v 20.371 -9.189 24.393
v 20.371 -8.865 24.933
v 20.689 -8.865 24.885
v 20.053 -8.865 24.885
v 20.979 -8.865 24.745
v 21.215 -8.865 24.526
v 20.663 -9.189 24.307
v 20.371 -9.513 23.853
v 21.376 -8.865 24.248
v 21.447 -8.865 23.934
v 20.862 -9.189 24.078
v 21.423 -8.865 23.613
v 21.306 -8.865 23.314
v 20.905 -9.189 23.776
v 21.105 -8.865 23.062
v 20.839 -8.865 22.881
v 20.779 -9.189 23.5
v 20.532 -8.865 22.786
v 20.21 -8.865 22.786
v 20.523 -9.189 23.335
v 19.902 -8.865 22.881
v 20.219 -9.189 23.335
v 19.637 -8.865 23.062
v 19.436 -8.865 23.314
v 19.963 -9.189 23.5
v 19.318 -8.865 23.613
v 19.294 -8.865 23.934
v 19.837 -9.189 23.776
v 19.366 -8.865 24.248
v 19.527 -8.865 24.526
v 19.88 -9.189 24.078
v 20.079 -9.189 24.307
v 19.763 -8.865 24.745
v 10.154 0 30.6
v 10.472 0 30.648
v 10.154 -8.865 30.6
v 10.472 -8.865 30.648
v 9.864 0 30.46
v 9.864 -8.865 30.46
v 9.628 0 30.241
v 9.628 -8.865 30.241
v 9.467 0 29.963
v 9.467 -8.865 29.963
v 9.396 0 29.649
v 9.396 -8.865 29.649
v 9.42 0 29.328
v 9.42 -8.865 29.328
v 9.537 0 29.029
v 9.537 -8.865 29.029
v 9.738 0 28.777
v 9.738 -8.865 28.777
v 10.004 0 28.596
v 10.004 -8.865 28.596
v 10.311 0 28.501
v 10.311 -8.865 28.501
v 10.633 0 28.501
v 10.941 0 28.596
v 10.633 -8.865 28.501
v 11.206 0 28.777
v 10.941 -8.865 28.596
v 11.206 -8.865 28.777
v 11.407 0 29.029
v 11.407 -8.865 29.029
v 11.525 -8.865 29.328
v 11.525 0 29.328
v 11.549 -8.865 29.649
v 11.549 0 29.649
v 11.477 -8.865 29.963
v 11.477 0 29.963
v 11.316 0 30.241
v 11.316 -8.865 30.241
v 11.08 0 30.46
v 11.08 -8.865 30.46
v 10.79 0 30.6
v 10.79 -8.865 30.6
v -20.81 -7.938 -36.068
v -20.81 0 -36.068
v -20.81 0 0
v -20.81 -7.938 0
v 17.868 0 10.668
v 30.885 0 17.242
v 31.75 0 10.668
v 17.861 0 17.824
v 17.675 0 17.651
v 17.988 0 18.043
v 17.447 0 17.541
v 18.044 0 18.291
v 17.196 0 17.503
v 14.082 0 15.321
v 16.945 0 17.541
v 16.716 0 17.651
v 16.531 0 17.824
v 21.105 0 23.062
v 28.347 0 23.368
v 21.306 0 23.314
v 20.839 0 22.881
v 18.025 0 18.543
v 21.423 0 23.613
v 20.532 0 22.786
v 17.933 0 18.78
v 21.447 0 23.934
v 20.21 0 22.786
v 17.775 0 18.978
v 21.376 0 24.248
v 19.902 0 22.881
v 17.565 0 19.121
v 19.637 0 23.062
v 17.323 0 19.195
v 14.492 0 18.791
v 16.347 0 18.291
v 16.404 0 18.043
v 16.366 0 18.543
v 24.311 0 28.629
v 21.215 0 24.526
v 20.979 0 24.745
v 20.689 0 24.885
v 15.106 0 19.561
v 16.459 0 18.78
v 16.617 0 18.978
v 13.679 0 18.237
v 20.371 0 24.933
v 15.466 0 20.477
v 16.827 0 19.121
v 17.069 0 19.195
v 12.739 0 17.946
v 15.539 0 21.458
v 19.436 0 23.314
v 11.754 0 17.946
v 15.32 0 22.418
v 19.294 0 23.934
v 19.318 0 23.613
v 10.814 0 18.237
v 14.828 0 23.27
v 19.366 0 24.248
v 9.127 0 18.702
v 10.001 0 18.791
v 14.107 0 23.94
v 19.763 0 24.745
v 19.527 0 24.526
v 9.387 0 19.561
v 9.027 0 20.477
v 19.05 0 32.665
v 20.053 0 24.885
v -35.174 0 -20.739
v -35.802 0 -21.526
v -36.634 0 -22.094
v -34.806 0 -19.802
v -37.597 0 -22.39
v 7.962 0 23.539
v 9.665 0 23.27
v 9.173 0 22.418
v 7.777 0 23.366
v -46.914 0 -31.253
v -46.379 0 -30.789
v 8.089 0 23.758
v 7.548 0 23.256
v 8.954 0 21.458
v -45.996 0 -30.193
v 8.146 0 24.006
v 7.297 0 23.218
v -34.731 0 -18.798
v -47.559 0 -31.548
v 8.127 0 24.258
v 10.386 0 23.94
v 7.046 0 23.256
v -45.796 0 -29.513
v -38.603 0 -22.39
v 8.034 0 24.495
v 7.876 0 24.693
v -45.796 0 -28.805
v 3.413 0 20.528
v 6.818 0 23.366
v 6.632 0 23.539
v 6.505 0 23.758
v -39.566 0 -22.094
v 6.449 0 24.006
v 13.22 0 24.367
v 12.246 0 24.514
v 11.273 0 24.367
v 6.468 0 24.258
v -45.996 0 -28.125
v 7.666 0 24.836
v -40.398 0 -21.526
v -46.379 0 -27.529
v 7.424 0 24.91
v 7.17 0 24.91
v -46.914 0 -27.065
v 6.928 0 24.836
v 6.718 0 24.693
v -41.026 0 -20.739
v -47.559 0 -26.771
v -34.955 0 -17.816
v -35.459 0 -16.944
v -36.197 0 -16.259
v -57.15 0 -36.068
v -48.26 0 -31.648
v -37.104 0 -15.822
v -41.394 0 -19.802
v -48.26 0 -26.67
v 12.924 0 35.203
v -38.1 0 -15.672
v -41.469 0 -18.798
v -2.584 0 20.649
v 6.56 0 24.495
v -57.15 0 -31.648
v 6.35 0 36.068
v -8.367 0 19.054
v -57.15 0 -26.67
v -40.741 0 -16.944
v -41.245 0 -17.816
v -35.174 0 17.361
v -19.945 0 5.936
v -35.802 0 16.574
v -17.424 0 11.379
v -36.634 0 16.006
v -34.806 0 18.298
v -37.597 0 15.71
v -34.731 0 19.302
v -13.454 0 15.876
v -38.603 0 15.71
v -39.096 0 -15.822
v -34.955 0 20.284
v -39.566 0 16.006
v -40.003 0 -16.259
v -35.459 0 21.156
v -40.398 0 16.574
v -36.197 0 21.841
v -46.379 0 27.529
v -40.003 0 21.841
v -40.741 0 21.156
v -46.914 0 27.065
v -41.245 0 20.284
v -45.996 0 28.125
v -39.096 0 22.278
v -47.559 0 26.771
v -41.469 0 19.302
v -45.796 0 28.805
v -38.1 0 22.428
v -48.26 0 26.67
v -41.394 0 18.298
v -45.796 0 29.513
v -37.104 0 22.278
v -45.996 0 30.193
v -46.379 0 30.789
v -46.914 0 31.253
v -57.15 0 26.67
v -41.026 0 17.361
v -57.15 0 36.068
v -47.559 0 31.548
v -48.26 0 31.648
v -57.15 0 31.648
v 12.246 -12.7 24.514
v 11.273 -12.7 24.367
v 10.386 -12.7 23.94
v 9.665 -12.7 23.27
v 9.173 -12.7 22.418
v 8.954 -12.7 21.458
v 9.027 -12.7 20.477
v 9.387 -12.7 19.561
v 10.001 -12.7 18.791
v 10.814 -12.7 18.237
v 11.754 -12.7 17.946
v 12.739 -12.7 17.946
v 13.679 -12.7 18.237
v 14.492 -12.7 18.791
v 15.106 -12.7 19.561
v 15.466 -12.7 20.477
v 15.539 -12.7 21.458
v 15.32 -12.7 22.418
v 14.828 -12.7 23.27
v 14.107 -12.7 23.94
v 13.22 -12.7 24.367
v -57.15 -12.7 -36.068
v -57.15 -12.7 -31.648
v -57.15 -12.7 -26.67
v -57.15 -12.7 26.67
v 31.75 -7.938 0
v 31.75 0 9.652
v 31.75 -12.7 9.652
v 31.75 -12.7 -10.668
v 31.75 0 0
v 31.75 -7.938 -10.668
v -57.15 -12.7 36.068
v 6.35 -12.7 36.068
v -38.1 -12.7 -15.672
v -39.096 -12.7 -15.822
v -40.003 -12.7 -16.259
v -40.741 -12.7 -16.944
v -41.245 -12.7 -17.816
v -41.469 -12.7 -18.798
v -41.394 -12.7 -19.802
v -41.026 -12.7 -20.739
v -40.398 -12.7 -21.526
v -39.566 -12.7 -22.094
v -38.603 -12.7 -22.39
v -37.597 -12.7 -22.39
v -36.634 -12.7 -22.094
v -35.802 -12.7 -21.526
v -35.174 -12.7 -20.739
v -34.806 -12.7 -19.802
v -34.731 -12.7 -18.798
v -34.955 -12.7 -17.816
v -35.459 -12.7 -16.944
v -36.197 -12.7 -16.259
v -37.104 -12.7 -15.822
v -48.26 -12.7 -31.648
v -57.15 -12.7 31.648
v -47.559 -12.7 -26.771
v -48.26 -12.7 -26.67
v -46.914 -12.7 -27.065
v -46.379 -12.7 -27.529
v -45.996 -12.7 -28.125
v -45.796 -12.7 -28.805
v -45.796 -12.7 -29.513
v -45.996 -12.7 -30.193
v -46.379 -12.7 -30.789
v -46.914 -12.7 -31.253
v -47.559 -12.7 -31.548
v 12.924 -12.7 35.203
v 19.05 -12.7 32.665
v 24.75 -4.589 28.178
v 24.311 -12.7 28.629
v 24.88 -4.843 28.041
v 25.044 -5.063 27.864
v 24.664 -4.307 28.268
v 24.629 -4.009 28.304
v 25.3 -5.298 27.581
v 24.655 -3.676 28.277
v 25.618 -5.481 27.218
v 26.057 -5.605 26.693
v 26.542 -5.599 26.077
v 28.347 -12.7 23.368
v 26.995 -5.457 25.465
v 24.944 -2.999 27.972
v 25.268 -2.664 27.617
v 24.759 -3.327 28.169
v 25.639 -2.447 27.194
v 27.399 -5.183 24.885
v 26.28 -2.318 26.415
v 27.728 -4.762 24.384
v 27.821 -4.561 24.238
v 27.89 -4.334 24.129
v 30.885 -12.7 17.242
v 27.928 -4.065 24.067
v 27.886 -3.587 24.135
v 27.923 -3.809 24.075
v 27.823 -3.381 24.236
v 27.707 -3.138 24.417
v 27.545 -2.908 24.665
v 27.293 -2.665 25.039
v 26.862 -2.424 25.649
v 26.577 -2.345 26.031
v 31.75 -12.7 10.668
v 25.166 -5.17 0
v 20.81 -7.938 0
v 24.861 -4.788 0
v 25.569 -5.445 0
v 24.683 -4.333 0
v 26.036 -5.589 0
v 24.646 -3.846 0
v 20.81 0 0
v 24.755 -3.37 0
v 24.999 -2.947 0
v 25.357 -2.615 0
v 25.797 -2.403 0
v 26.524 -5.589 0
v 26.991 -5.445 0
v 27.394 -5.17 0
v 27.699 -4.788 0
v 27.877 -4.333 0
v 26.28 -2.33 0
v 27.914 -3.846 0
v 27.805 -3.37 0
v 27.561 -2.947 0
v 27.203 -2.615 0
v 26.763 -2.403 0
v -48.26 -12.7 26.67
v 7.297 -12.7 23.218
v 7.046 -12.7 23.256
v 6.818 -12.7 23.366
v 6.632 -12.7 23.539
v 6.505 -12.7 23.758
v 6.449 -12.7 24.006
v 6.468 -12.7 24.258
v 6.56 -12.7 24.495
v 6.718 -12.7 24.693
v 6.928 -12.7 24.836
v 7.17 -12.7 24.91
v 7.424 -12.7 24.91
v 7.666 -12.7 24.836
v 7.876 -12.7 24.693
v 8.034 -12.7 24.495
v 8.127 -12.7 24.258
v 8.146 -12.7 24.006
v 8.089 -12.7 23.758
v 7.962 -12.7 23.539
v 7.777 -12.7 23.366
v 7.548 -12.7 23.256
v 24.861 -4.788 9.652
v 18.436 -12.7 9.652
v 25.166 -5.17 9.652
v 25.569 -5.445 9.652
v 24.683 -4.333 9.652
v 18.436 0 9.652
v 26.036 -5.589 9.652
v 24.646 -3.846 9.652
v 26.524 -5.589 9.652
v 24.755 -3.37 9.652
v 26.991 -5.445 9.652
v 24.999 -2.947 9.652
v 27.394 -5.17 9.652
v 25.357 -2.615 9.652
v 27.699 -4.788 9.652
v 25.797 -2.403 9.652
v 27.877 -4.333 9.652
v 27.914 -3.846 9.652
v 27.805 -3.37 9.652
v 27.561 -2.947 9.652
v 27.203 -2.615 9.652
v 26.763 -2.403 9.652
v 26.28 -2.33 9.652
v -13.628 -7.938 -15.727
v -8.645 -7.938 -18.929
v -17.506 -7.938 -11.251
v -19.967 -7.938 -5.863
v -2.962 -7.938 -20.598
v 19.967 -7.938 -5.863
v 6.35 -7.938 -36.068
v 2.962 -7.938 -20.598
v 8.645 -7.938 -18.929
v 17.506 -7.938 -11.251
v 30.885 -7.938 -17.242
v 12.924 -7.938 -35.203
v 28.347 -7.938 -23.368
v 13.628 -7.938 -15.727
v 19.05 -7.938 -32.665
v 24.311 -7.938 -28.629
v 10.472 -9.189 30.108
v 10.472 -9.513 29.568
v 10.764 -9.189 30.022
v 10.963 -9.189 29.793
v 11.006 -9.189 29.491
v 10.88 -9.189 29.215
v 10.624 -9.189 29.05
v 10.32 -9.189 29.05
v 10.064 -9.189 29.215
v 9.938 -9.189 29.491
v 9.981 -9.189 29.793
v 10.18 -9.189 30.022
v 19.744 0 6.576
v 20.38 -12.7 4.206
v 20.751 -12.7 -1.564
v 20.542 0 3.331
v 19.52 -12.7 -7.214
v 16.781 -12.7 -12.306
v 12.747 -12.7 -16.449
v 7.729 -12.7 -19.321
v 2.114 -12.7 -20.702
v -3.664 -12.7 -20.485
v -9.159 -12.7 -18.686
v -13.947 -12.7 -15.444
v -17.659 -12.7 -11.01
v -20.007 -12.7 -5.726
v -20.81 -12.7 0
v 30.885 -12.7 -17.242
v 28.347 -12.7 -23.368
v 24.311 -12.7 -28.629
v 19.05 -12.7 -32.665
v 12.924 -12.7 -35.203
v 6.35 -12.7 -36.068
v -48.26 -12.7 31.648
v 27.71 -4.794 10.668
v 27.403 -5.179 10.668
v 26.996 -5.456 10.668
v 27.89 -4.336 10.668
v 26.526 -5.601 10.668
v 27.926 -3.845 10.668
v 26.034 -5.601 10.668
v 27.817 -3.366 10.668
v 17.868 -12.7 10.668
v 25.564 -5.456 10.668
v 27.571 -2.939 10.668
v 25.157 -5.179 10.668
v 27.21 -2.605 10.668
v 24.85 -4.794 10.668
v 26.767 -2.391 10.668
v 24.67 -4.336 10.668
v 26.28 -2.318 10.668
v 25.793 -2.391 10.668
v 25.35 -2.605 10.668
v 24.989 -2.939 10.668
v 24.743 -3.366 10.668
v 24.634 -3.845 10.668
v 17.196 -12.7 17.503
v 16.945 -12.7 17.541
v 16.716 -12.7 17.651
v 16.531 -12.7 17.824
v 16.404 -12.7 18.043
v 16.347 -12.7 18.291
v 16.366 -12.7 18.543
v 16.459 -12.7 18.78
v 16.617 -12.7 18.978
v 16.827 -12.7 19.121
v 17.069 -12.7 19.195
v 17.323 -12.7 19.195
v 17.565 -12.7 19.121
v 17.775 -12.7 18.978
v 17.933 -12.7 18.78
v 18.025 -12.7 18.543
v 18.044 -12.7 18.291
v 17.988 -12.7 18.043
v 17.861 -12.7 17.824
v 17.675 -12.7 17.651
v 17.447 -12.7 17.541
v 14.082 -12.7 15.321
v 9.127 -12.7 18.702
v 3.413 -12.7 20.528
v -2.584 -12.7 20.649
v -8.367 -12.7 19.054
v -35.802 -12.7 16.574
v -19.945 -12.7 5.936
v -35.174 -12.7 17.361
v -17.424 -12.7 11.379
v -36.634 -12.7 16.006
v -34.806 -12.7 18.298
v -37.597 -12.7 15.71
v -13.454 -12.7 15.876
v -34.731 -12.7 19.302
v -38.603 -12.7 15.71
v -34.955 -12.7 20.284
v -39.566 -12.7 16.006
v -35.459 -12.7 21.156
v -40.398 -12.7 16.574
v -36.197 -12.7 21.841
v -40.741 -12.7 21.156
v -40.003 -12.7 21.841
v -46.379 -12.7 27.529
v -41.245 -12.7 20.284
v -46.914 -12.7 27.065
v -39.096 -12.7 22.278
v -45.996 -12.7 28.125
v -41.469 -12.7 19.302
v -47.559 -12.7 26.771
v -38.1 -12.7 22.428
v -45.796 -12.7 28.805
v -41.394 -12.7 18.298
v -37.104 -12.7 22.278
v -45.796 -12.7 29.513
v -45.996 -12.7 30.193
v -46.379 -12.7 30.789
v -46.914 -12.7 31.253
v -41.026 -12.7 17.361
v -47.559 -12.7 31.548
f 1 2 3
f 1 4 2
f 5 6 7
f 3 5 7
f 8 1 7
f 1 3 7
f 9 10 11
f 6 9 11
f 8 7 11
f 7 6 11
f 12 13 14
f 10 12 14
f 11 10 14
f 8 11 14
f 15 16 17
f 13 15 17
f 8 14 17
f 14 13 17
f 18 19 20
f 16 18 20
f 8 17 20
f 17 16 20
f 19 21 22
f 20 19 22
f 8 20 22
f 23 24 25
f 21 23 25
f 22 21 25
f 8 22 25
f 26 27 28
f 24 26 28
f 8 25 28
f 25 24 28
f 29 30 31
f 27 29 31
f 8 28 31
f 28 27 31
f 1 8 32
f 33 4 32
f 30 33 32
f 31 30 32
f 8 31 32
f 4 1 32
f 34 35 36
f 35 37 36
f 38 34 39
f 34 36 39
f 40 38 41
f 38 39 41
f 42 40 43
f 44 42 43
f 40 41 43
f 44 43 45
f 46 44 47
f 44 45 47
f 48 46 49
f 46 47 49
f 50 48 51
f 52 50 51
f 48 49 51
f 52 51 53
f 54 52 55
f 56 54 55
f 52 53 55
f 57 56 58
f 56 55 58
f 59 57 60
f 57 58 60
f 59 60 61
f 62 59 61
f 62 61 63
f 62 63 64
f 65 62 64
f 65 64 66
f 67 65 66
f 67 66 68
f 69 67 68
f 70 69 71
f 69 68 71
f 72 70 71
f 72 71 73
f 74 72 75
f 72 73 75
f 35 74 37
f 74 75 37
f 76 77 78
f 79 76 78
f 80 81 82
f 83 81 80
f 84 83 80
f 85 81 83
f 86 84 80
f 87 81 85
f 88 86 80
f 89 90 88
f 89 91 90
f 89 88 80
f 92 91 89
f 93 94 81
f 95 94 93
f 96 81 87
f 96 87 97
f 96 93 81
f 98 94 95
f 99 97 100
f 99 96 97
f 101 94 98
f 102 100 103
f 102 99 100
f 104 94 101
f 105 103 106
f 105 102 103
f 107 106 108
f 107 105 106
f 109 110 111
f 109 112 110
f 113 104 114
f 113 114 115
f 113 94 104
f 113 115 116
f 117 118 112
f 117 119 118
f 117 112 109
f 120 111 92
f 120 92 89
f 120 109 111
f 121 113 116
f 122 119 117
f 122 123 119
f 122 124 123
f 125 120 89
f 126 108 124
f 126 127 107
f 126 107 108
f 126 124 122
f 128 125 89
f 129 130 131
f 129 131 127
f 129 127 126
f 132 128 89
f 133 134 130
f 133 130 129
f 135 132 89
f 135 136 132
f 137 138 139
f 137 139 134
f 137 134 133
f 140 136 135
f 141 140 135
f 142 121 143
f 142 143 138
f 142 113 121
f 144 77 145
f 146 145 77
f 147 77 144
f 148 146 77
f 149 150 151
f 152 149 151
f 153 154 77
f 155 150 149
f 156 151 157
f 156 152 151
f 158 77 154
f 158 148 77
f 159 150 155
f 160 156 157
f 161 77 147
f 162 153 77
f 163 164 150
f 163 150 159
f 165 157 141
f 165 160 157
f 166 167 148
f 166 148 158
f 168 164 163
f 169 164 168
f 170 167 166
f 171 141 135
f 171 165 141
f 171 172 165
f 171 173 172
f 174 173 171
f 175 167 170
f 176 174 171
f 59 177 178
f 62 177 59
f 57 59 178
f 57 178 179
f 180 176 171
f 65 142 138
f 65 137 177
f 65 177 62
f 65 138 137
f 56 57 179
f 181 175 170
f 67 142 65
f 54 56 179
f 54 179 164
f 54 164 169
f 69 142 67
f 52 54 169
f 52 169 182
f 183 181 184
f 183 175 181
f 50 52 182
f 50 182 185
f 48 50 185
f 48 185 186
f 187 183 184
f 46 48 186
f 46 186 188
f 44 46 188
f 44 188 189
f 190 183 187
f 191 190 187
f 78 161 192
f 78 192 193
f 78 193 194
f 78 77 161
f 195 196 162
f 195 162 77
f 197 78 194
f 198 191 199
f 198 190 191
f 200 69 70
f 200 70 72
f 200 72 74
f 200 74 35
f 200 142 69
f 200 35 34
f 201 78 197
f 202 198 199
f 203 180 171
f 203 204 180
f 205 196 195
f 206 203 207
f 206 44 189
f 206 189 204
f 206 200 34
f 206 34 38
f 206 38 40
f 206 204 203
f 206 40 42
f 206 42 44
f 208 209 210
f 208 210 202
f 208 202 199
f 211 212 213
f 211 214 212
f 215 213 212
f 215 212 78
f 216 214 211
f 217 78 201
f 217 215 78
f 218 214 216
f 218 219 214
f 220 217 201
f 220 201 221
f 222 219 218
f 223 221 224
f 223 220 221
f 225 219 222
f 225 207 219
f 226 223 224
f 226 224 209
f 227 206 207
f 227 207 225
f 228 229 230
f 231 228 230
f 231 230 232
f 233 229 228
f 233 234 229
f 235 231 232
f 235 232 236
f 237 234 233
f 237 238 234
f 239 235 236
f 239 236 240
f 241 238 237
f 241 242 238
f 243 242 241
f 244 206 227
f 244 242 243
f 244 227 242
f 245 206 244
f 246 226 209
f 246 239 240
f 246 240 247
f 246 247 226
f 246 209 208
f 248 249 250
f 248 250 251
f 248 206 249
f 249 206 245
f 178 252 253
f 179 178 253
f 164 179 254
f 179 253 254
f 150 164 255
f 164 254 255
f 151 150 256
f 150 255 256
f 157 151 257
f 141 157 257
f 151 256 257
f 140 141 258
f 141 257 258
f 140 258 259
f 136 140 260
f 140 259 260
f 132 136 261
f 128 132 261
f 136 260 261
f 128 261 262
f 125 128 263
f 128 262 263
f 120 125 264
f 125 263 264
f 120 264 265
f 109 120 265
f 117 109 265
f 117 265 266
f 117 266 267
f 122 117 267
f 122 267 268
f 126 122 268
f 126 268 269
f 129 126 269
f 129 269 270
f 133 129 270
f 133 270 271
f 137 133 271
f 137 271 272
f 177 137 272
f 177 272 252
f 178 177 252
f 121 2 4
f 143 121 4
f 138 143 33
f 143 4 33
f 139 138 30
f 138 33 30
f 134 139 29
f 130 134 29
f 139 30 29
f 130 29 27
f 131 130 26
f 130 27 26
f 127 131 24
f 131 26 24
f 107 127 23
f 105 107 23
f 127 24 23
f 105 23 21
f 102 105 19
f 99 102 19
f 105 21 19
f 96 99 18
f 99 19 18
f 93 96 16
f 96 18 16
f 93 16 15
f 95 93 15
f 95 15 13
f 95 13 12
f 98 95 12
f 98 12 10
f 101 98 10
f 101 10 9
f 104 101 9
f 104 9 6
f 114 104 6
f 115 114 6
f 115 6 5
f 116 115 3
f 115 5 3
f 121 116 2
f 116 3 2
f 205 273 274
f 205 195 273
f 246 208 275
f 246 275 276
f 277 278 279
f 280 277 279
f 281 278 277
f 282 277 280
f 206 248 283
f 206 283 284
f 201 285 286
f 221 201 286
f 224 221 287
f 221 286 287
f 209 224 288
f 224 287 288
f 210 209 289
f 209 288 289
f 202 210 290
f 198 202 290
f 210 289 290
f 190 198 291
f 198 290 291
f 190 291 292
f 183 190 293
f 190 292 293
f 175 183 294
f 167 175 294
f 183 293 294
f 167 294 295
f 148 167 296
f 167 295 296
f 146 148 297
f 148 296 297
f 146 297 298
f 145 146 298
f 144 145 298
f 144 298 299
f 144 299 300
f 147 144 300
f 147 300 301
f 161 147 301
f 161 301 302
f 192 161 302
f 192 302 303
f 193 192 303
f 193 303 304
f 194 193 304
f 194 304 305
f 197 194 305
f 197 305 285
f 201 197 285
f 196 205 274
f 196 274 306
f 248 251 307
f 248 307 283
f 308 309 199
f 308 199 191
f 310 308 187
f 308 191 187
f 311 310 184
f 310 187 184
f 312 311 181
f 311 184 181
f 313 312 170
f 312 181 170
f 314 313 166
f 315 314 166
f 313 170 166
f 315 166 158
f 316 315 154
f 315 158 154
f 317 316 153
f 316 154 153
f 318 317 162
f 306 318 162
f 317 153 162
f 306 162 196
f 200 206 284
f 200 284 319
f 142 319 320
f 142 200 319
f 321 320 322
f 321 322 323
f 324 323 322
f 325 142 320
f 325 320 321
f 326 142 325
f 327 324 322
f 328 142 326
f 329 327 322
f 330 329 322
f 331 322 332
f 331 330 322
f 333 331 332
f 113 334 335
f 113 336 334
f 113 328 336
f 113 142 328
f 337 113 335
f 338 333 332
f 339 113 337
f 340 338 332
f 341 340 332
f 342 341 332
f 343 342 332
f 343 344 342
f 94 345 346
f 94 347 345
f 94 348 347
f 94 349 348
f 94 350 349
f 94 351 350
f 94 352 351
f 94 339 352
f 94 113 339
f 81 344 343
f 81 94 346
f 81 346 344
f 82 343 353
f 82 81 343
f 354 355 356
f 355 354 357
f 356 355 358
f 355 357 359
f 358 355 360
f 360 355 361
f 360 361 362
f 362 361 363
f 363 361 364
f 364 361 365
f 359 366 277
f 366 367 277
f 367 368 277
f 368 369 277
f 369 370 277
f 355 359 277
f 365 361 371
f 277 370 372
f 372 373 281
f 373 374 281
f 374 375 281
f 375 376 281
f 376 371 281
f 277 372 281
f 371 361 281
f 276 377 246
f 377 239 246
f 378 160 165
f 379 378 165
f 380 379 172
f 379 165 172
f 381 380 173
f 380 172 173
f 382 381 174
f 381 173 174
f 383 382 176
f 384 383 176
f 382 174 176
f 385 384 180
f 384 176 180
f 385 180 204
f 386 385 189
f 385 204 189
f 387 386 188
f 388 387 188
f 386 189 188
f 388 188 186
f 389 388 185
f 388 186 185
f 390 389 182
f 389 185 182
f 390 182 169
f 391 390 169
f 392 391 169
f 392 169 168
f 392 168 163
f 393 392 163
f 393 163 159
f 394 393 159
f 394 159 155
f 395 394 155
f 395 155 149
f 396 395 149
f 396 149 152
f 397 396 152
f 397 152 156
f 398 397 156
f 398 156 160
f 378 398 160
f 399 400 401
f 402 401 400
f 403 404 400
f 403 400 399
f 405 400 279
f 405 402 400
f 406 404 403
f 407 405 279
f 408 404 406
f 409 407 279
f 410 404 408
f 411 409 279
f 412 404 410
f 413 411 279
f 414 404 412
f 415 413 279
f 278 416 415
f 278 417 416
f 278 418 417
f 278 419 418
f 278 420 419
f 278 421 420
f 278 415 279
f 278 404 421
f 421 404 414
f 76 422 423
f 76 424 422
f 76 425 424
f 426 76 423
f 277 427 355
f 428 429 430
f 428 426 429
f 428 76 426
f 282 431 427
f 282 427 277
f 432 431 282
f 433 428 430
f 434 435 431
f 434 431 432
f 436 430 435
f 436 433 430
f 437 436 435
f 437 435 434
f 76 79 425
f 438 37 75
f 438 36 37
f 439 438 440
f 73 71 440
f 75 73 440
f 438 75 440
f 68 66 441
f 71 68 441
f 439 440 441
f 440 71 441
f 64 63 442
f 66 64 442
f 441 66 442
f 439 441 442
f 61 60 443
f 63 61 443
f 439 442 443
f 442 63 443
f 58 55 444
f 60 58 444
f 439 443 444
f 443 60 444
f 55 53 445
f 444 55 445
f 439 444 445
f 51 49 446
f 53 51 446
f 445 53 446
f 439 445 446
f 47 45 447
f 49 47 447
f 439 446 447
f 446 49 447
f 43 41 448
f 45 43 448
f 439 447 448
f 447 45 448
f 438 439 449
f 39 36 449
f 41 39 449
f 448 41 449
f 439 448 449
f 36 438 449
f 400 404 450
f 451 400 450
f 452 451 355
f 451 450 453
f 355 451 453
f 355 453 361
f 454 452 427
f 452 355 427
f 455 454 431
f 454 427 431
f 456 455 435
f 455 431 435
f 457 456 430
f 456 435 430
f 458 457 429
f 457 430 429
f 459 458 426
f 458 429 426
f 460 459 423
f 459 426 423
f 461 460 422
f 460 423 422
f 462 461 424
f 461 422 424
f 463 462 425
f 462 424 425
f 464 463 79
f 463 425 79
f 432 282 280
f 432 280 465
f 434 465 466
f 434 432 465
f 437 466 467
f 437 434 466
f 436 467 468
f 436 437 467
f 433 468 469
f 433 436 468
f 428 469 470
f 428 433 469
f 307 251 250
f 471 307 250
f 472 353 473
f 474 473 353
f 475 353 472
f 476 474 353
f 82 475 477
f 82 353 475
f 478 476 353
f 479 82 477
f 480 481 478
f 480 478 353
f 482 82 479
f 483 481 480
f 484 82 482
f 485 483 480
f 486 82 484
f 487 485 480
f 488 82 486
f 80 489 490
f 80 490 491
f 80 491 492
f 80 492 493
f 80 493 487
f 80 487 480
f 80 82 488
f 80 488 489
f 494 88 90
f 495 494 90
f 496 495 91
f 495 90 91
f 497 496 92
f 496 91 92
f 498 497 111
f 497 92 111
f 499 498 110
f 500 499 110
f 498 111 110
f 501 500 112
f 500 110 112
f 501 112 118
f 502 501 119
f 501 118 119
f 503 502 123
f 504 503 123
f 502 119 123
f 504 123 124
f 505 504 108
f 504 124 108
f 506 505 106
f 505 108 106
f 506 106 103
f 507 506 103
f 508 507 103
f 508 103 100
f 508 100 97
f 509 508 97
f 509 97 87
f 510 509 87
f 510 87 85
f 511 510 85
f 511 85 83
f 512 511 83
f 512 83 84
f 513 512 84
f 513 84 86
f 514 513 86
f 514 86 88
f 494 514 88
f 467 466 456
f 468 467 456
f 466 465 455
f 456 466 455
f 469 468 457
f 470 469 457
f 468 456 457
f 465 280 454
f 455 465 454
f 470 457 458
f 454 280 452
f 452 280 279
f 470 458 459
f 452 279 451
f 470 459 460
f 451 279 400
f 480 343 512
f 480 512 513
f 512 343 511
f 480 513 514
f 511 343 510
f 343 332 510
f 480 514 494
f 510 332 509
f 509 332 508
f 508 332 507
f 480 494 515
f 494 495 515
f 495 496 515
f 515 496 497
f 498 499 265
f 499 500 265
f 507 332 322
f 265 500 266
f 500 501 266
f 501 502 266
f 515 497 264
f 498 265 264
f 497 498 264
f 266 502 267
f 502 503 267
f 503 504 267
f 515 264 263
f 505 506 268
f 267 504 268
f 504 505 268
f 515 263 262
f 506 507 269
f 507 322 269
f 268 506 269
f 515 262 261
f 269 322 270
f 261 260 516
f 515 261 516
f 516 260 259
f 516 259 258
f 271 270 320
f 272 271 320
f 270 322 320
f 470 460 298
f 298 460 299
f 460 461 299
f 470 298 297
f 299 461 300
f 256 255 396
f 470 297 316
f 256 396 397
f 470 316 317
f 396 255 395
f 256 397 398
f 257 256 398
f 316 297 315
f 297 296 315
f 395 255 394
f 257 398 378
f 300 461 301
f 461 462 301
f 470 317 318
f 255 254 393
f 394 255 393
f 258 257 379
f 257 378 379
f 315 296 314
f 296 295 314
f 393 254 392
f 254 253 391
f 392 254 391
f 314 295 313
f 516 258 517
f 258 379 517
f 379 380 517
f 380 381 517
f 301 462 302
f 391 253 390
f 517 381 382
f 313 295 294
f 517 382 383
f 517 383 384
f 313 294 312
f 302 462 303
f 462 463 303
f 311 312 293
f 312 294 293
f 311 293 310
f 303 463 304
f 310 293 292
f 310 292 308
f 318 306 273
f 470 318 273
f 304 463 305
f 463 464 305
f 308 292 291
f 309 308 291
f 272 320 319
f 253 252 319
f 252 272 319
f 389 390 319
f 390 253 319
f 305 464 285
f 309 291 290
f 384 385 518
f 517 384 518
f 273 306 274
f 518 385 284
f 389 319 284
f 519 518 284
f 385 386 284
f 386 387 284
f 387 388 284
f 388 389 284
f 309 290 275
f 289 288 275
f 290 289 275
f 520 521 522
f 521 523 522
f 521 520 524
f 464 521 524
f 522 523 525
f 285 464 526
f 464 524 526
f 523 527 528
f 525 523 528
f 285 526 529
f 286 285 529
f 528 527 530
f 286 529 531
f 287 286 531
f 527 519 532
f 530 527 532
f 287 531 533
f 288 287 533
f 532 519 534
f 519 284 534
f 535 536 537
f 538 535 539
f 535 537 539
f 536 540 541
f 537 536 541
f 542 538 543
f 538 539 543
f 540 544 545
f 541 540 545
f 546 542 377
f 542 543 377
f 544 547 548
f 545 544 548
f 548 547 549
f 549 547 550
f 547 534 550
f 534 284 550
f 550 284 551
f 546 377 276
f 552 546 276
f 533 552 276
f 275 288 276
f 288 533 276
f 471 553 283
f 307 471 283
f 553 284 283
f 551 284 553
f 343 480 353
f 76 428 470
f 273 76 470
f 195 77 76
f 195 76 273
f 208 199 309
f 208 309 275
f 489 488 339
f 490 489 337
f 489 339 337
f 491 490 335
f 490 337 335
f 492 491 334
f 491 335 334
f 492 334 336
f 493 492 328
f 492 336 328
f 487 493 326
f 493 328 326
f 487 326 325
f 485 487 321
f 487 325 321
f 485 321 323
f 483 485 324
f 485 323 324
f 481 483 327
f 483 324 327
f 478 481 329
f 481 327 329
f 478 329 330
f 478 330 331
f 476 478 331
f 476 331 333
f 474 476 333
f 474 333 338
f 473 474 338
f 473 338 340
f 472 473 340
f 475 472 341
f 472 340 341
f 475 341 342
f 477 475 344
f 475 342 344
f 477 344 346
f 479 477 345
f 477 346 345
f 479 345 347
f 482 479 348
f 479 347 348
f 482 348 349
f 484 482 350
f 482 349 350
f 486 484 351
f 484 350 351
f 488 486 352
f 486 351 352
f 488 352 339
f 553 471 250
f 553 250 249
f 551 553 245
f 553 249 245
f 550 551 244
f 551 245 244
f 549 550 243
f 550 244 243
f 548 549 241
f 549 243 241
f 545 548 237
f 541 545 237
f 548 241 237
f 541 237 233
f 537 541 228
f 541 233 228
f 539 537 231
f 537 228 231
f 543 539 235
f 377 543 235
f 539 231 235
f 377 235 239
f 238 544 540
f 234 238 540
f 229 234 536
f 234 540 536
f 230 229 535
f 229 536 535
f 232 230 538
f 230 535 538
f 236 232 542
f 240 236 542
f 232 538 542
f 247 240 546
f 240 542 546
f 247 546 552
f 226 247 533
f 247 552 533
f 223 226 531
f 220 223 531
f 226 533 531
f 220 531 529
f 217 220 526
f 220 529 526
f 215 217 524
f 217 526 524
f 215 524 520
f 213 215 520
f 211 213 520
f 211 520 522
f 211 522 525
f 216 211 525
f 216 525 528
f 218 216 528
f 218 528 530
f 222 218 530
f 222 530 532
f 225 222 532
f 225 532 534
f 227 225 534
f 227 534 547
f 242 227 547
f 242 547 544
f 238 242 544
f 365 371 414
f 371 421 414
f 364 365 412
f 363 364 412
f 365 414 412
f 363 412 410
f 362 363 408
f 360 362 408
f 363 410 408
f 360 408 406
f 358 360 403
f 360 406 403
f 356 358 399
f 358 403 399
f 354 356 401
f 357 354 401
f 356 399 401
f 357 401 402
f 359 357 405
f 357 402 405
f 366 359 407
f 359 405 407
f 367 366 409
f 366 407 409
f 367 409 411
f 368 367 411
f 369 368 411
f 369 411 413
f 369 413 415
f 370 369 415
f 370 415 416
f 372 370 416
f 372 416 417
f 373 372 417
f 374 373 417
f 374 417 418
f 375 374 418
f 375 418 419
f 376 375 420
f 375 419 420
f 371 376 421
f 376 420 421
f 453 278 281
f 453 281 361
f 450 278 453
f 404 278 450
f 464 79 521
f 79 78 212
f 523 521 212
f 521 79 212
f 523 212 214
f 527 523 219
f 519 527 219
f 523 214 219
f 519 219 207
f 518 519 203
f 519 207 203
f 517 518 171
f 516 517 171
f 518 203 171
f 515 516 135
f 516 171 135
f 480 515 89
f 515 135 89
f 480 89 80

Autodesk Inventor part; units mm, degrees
ref_plane "YZ Plane" through (0, 0, 0) normal (1, 0, 0) x (0, 1, 0)
ref_plane "XZ Plane" through (0, 0, 0) normal (0, 1, 0) x (-1, 0, 0)
ref_plane "XY Plane" through (0, 0, 0) normal (0, 0, 1) x (1, 0, 0)
sketch "Sketch1" plane through (0, 0, 0) normal (0, 1, 0) x (-1, 0, 0)
  line L0 (-54.2742, 0) -> (84.3226, 0) construction
  line L1 (-6.35, -36.068) -> (57.15, -36.068)
  line L2 (57.15, -36.068) -> (57.15, 36.068)
  line L3 (57.15, 36.068) -> (-6.35, 36.068)
  line L4 (-31.75, 10.668) -> (-31.75, -10.668)
  circle A0 centre (0, 0) radius 17 construction
  circle A1 centre (0, 0) radius 20.81
  line L5 (0, 0) -> (-18.9066, 32.7472) construction
  circle A2 centre (0, 0) radius 3.81 construction
  arc A3 (-6.35, 36.068) -> (-31.75, 10.668) centre (-6.35, 10.668) ccw
  arc A4 (-31.75, -10.668) -> (-6.35, -36.068) centre (-6.35, -10.668) ccw
  circle A5 centre (-12.2465, 21.2116) radius 1.6256 construction
  line L6 (0, 0) -> (31.1733, 53.9938) construction
  circle A6 centre (24.493, 0) radius 1.6256 construction
  circle A7 centre (-12.2465, -21.2116) radius 1.6256 construction
  circle A8 centre (-12.2465, 21.2116) radius 3.175 construction
  point P0 (-31.75, -36.068)
  point P1 (-31.75, 36.068)
  dimension "d0" = 72.136
  dimension "d1" = 88.9
  dimension "d2" = 34
  dimension "d3" = 3.81
  dimension "d4" = 31.75
  dimension "tri_angle" = 120
  dimension "fov_diameter" = 7.62
  dimension "d9" = 25.4
  dimension "d12" = 3.2512
  dimension "mount_radius" = 24.493
  dimension "d14" = 60
  dimension "d25" = 6.35
  dimension "main_aperture_diameter" = 41.62
  dimension "d67" = 2.0574
  dimension "d68" = 10.94
extrude "Extrusion2" add sketch "Sketch1" against normal blind 12.7
sketch "Sketch12" plane through (0, 0, 0) normal (0, 1, 0) x (1, 0, 0)
  line L0 (0, 0) -> (18.9066, -32.7472) construction
  line L1 (12.2465, -21.2116) -> (8.7633, -23.2226) construction
  point P0 (7.2972, -24.0691)
  point P1 (17.1958, -18.3541)
  dimension "d94" = 11.43
sketch "Sketch13" plane through (0, 0, 0) normal (0, 1, 0) x (1, 0, 0)
  line L0 (0, 0) -> (18.9066, -32.7472) construction
  point P0 (12.2465, -21.2116)
hole "Hole4" at (12.2465, 0, 21.2116) direction (0, -1, 0) diameter 6.604 depth 25.4 tip angle 118
sketch "Sketch14" plane through (0, 0, 0) normal (0, 1, 0) x (1, 0, 0)
  line L0 (-112.042, 0) -> (81.9935, 0) projected
  line L1 (-58.42, 29.1592) -> (-48.26, 29.1592) construction
  line L2 (-58.42, 31.6484) -> (-48.26, 31.6484)
  line L3 (-48.26, 26.67) -> (-58.42, 26.67)
  arc A0 (-58.42, 31.6484) -> (-58.42, 26.67) centre (-58.42, 29.1592) ccw
  arc A1 (-48.26, 26.67) -> (-48.26, 31.6484) centre (-48.26, 29.1592) ccw
  line L4 (-58.42, -31.6484) -> (-48.26, -31.6484)
  line L5 (-48.26, -26.67) -> (-58.42, -26.67)
  arc A2 (-58.42, -26.67) -> (-58.42, -31.6484) centre (-58.42, -29.1592) ccw
  arc A3 (-48.26, -31.6484) -> (-48.26, -26.67) centre (-48.26, -29.1592) ccw
  point P0 (0, 0)
  point P1 (-53.34, 29.1592)
  dimension "d102" = 4.9784
  dimension "d103" = 48.26
  dimension "d104" = 29.1592
  dimension "d105" = 10.16
extrude "Extrusion11" cut sketch "Sketch14" against normal blind 25.4
sketch "Sketch16" plane through (0, 0, 0) normal (0, 1, 0) x (1, 0, 0)
  line L0 (-112.042, 0) -> (81.9935, 0) projected
  line L1 (0, 50.4952) -> (0, -50.4952) projected
  arc A0 (-20.81, 0) -> (-20.81, 0) centre (0, 0) ccw projected
  line L2 (-20.81, 81.7717) -> (-20.81, 0)
  line L3 (0, 0) -> (42.69, 0)
  line L4 (42.69, 0) -> (42.69, 81.7717)
  line L5 (42.69, 81.7717) -> (-20.81, 81.7717)
  line L6 (0, 0) -> (-20.81, 0)
  line L7 (-20.81, 0) -> (-37.279, 0)
  dimension "d112" = 63.5
  dimension "d113" = 81.7717
  dimension "d124" = 0
extrude "Extrusion13" cut sketch "Sketch16" against normal blind 7.9375 contours A0 L1 L0 | L2 L5 L4 L0 A0 | L1 A0 L0 picked at (-13.6994, 1.5436) picked at (7.3346, 11.673)
sketch "Sketch17" plane through (0, -12.7, 0) normal (0, -1, 0) x (1, 0, 0)
  point P0 (0, 0)
  point P1 (7.2972, 24.0691)
  point P2 (17.1958, 18.3541)
hole "Hole6" at (7.2972, -12.7, 24.0691) at (17.1958, -12.7, 18.3541) direction (0, 1, 0) diameter 1.7018 depth 25.4 tip angle 118
sketch "Sketch18" plane through (0, 0, 0) normal (0, 1, 0) x (1, 0, 0)
  line L0 (0, 0) -> (18.9066, -32.7472) construction
  line L1 (7.2972, -24.0691) -> (11.5397, -31.4173) construction
  point P0 (17.1958, -18.3541)
  point P1 (10.4722, -29.5683)
  point P2 (20.3708, -23.8533)
  dimension "d125" = 6.35
hole "Hole7" at (10.4722, 0, 29.5683) at (20.3708, 0, 23.8533) direction (0, -1, 0) diameter 2.159 depth 8.8646 tip angle 118
sketch "Sketch19" plane through (0, 0, 0) normal (0, 1, 0) x (1, 0, 0)
  line L0 (54.2742, 0) -> (-84.3226, 0) construction
  point P0 (0, 0)
  point P1 (0, 0)
  point P2 (-38.1, 19.05)
  point P3 (-38.1, -19.05)
  dimension "d133" = 38.1
  dimension "d134" = 38.1
hole "Hole8" at (-38.1, 0, 19.05) at (-38.1, 0, -19.05) direction (0, -1, 0) diameter 6.7564 depth 19.05 tip angle 118 clearance for "Flat Head Machine Screw (82)" size "1/4" standard "Ansi Unified Screw Threads"
sketch "Sketch20" plane through (0, 0, 0) normal (0, 1, 0) x (1, 0, 0)
  line L0 (31.75, -10.668) -> (15.3822, -10.668)
  line L1 (15.3822, -10.668) -> (15.3822, -9.652)
  line L2 (15.3822, -9.652) -> (31.75, -9.652)
  line L3 (31.75, -9.652) -> (31.75, -10.668)
  point P0 (0, 0)
  dimension "d142" = 1.016
  dimension "d143" = 16.3678
extrude "Extrusion14" cut sketch "Sketch20" against normal blind 25.4
sketch "Sketch21" plane through (31.75, 0, 0) normal (0, 0, -1) x (-1, 0, 0)
  line L0 (0, -7.9375) -> (0, 0) construction
  line L1 (0, -7.9375) -> (10.94, -7.9375) construction
  line L2 (10.94, 0) -> (10.94, -7.9375) construction
  line L3 (0, 0) -> (10.94, 0) construction
  line L4 (10.94, 0) -> (0, -7.9375) construction
  line L5 (0, 0) -> (25.4, 0) construction
  line L6 (0, -7.9375) -> (10.94, -7.9375) construction
  line L7 (0, 0) -> (10.94, -7.9375) construction
  point P0 (31.75, 0)
  point P1 (5.47, -3.9688)
hole "Hole9" at (26.28, -3.9688, 0) direction (0, 0, 1) diameter 3.2766 depth 10.16 clearance for "Flat Head Machine Screw (82)" size "#4" standard "Ansi Unified Screw Threads"
sketch "Sketch22" plane through (31.75, 0, 10.668) normal (0, 0, -1) x (-1, 0, 0)
  point P0 (31.75, 0)
  point P1 (5.47, -3.9688)
hole "Hole10" at (26.28, -3.9688, 10.668) direction (0, 0, 1) diameter 3.302 depth 25.4 tip angle 118 thread size "8-32 UNC" class "2B" standard "ANSI Unified Screw Threads"
sketch "Sketch23" plane through (0, -12.7, 0) normal (0, -1, 0) x (1, 0, 0)
  line L0 (0, 0) -> (18.9066, 32.7472) construction
  arc A0 (17.8676, 10.668) -> (18.4362, 9.652) centre (0, 0) ccw projected
  arc A1 (31.75, 10.668) -> (6.35, 36.068) centre (6.35, 10.668) ccw projected
  circle A2 centre (13.5955, 23.5481) radius 6
  line L1 (6.5804, 20.67) -> (17.5284, 14.3493) construction
  circle A3 centre (12.2465, 21.2116) radius 3.302 construction
  dimension "d160" = 12
extrude "Extrusion15" [suppressed]
equation "\"fov_diameter\" = 2 * d3"
equation "\"d14\" = 0.5 * tri_angle"
equation "\"d15\" = plate_thickness"
equation "\"plate_thickness\" = 12.7"
equation "\"magnet_depth\" = plate_thickness - pin_depth"
equation "\"hole_diameter\" = d2 + fov_diameter"
equation "\"pin_depth\" = 2.921"
properties part number "v2_tri_mount"
